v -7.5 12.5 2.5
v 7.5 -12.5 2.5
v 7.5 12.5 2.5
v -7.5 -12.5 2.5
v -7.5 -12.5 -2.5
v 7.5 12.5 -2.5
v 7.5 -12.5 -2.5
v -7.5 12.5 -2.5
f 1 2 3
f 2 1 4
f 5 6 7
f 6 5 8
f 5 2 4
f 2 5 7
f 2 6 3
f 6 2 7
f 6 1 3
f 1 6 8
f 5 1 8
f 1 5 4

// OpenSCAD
// Generated by generate_scads.py
cube(size=[15,25,5], center=true);
